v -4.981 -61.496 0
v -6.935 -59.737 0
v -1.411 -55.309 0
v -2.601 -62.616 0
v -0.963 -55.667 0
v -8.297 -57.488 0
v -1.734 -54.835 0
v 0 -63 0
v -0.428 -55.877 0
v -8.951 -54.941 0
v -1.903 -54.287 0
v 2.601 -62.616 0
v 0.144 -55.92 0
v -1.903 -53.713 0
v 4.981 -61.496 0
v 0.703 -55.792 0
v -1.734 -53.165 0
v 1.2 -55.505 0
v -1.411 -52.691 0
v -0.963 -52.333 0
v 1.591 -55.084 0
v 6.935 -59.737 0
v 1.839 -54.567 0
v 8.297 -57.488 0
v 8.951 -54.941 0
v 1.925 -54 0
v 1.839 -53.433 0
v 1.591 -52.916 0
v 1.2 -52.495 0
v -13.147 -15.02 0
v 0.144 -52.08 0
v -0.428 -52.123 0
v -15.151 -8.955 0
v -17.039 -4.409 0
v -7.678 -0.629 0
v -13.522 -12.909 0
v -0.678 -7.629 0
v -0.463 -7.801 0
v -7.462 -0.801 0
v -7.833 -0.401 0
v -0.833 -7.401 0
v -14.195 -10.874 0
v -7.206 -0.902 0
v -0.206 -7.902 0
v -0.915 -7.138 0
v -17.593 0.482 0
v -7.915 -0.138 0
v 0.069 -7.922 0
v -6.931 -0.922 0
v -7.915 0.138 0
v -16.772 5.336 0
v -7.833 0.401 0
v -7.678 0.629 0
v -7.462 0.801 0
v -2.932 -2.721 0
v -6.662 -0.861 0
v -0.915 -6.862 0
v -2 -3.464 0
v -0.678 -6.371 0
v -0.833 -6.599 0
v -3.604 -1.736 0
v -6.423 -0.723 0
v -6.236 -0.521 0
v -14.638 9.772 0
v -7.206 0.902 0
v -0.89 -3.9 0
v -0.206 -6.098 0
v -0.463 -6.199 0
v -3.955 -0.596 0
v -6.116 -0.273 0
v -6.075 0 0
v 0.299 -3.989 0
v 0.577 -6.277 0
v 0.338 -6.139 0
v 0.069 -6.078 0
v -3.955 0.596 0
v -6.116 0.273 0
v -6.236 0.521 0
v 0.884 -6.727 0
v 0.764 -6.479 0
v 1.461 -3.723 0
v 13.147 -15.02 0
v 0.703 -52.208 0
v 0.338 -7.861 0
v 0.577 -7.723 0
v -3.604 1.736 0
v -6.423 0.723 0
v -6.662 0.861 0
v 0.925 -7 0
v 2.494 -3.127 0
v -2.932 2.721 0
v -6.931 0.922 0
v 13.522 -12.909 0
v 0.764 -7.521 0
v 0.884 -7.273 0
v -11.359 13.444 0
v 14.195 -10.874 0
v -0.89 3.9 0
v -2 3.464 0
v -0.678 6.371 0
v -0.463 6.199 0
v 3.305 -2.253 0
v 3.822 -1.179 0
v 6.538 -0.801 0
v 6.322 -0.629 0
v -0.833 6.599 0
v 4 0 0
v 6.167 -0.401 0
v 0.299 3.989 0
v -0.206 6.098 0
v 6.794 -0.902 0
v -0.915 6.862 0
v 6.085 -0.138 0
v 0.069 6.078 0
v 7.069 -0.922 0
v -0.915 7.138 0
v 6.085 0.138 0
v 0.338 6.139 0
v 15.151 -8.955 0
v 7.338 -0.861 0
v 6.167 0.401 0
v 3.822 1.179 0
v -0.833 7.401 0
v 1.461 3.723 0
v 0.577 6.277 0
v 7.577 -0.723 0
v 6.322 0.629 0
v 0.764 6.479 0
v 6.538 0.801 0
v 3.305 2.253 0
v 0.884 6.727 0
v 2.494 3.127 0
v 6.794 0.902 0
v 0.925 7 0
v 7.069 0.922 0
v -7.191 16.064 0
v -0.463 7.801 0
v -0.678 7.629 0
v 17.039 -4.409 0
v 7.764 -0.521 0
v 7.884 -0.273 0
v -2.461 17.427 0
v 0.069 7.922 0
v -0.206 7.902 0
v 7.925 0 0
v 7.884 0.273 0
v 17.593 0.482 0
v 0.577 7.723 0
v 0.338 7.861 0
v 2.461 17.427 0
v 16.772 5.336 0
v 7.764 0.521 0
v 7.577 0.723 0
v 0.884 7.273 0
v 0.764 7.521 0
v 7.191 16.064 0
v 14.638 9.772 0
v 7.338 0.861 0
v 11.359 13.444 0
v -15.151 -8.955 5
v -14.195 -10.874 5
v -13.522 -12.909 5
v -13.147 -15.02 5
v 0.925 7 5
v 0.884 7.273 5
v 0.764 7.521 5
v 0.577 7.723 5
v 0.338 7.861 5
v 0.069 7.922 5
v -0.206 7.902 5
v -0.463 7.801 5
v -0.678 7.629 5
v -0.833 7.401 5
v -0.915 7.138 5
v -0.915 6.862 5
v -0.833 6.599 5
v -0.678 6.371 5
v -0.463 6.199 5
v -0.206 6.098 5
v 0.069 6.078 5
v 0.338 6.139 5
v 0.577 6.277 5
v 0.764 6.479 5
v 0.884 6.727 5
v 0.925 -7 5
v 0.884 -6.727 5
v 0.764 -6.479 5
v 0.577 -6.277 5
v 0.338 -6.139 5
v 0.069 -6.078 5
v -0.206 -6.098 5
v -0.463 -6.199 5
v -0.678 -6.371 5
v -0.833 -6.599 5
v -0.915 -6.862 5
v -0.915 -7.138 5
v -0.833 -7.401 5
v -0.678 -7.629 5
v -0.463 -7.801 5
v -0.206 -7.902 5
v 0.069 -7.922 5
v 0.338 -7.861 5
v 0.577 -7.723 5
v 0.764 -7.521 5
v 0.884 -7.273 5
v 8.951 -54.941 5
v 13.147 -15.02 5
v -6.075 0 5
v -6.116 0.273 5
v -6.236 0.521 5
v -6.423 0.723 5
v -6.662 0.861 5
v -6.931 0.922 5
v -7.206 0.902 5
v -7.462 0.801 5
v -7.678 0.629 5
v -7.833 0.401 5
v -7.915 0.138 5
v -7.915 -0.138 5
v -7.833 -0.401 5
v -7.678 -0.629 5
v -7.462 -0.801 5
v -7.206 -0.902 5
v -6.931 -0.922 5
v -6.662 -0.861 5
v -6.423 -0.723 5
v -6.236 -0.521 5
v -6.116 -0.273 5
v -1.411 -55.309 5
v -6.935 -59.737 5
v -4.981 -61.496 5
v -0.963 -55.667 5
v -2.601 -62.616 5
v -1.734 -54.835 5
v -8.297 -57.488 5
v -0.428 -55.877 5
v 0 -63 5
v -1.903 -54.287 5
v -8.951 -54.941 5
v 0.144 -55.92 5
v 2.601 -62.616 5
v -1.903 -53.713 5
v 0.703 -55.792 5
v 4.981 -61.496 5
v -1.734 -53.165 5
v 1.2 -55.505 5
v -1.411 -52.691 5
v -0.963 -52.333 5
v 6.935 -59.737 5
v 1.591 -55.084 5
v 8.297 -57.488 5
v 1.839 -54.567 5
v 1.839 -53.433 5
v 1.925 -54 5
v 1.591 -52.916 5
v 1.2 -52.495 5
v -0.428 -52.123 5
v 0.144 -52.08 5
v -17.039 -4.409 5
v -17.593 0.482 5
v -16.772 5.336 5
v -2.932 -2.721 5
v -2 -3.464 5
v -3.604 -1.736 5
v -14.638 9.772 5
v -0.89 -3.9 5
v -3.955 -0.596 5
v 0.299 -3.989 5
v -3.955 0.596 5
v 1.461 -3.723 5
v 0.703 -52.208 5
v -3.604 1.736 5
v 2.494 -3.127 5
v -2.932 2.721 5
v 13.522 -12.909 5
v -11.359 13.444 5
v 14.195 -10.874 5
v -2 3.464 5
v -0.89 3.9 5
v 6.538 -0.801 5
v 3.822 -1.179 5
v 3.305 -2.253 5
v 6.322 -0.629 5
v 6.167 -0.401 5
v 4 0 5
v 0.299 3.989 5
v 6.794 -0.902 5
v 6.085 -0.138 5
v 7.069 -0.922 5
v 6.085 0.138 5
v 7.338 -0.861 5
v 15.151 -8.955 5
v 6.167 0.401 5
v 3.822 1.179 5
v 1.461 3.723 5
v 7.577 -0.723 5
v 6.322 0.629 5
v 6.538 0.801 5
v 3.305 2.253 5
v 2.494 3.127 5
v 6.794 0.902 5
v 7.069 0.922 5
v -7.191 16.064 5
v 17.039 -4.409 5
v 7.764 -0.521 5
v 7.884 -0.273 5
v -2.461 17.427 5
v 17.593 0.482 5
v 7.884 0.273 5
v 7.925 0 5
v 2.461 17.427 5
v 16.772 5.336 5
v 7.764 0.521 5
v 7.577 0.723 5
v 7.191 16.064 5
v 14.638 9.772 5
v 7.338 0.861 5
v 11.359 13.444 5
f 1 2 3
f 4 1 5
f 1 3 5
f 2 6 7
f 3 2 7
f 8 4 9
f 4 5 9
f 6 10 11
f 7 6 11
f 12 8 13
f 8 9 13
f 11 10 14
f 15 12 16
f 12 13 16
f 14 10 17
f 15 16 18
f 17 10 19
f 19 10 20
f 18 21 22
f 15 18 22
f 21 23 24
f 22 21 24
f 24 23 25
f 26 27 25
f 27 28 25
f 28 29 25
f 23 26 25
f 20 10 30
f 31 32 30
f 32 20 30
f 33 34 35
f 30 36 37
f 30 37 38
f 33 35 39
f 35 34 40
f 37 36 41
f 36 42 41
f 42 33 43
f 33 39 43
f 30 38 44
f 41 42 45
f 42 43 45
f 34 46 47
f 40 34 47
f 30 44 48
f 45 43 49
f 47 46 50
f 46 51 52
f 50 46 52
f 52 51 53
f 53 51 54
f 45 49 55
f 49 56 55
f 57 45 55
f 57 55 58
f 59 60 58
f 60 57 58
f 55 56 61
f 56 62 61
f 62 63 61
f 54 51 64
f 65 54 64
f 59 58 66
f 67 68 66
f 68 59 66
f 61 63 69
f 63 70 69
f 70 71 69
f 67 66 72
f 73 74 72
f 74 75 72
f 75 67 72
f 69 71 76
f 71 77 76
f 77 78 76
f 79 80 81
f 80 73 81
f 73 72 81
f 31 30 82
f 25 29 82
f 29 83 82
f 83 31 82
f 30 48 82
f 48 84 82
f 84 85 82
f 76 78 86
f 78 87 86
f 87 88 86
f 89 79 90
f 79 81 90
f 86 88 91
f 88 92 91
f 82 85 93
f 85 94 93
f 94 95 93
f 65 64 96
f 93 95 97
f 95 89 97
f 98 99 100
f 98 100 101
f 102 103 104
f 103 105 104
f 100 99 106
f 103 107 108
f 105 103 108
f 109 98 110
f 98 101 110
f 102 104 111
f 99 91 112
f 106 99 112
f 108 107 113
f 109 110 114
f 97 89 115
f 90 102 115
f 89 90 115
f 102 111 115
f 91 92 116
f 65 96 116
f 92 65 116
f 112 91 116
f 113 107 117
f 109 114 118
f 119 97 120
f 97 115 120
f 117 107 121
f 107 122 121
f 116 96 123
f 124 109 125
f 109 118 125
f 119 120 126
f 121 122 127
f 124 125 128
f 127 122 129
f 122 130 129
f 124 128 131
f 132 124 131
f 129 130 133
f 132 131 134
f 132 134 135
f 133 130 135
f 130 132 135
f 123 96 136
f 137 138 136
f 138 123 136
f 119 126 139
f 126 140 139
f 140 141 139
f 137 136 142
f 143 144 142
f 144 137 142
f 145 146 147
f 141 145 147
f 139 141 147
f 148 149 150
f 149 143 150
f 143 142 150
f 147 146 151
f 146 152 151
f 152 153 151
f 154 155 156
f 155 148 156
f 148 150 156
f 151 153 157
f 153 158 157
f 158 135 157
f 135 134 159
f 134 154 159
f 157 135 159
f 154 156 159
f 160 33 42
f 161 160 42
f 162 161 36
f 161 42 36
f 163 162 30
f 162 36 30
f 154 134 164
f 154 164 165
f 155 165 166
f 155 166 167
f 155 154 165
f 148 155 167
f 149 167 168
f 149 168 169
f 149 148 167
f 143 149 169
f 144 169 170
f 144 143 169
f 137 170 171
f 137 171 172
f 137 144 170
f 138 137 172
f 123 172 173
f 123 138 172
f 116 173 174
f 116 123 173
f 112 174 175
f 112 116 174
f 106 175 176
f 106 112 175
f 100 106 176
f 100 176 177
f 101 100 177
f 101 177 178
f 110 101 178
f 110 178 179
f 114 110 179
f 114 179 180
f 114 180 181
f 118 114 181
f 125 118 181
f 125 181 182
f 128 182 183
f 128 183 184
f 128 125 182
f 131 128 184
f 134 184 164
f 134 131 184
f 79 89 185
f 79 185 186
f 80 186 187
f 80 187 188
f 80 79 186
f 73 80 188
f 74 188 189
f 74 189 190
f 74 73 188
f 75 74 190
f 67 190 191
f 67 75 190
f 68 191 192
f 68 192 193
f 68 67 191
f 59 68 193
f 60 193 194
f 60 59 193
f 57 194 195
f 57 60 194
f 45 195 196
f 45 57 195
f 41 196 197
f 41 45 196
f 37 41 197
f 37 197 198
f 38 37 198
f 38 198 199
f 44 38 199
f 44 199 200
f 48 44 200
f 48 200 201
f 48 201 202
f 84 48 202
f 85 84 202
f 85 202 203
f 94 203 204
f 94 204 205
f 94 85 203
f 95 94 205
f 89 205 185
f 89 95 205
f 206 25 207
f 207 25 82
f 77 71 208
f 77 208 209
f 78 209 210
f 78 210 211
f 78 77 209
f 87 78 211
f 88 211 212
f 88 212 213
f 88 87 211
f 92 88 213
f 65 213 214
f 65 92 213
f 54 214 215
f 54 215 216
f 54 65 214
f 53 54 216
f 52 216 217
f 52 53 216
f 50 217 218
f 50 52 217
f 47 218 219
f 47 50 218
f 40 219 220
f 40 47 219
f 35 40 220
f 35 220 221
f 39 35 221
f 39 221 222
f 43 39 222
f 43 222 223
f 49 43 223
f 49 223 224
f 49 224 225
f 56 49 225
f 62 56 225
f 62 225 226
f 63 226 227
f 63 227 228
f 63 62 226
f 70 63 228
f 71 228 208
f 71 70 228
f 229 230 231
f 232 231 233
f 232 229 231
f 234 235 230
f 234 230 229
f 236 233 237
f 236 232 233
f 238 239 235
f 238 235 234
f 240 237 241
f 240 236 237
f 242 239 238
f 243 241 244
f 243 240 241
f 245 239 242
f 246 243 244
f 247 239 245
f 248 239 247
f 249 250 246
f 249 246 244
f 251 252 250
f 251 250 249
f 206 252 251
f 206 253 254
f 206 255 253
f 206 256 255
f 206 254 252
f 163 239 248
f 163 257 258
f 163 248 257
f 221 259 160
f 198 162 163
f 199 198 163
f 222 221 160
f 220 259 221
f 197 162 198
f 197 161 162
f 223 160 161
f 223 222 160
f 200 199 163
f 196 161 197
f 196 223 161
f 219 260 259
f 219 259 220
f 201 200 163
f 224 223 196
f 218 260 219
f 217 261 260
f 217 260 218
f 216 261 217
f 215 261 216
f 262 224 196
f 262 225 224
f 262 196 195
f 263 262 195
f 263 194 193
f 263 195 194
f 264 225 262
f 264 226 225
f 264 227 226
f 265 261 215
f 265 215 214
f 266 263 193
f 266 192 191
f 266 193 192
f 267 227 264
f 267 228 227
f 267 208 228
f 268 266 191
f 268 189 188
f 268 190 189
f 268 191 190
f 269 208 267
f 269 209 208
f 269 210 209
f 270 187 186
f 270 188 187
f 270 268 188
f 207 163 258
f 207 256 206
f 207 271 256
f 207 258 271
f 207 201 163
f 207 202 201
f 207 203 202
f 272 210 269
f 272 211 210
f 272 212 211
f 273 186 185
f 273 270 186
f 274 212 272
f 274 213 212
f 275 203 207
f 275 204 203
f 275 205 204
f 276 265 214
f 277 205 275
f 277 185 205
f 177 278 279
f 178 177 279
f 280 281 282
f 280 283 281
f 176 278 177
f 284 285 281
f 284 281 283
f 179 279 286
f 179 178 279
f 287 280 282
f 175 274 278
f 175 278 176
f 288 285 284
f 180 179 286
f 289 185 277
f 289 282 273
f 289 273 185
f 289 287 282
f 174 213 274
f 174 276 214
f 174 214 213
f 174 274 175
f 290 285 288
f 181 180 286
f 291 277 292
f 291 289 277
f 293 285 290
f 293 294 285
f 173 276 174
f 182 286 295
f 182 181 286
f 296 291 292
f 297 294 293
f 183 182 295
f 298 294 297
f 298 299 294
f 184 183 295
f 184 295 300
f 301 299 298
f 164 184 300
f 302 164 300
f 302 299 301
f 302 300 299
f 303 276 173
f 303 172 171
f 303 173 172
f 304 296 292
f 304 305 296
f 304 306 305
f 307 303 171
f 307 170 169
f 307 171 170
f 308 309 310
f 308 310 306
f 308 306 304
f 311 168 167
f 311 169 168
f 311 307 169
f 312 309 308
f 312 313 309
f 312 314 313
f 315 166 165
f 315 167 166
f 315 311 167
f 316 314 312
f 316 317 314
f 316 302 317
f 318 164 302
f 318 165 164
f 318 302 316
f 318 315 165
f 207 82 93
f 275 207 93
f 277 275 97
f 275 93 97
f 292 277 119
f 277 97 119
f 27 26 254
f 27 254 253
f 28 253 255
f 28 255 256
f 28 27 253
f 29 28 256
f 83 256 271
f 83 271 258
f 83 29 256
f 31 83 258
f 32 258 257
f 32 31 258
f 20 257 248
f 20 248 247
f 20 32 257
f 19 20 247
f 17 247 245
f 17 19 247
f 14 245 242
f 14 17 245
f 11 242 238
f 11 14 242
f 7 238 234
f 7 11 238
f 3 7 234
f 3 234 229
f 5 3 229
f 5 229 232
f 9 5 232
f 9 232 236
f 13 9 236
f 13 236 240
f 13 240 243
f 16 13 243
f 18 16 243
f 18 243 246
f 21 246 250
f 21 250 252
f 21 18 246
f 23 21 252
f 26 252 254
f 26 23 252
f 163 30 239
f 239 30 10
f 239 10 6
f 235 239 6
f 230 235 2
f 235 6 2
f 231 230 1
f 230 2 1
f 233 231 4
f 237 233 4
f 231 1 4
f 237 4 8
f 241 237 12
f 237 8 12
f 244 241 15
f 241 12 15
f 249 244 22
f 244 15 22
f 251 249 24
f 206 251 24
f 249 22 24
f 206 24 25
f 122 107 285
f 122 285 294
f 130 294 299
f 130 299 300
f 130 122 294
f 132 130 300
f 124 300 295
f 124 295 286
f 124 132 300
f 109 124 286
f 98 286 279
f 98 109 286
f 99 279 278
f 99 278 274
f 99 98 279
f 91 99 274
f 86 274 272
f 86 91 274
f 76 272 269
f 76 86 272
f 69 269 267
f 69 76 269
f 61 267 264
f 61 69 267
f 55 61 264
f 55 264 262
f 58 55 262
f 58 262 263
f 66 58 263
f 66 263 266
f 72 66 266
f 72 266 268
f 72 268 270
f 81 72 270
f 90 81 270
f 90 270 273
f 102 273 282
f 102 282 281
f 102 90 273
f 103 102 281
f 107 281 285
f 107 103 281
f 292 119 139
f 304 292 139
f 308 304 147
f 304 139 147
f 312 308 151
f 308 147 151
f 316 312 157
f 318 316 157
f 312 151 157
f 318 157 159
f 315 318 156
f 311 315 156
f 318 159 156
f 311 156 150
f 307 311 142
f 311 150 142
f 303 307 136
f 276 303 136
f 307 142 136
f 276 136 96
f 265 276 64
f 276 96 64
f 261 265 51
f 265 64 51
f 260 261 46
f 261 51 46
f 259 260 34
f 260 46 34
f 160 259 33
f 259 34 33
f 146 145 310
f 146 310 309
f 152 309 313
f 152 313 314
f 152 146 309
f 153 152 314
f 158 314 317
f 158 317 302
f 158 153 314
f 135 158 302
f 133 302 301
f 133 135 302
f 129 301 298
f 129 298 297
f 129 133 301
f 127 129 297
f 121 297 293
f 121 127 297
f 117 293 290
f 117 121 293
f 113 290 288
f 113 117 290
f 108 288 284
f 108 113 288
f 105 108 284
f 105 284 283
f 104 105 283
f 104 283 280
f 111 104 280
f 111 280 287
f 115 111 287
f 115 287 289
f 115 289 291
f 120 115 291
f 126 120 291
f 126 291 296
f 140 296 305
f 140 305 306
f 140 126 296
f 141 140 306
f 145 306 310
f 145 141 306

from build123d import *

# Parameters (mm, degrees)
ESQUISSE1_R        = 1.925
ESQUISSE1_R_2      = 0.925
ESQUISSE1_R_3      = 4
BOSS_EXTRU_1_DEPTH = 5


with BuildPart() as part:
    # Esquisse1 → Boss.-Extru.1 (new body)
    with BuildSketch(Plane.XY):
        with BuildLine():
            Line((8.950697062, -54.94075613), (13.146568064, -15.019708545))
            ThreePointArc((13.146568064, -15.019708545), (13.822417384, -11.87955399), (15.151330627, -8.955287839))
            ThreePointArc((15.151330627, -8.955287839), (0, 17.600000001), (-15.151330627, -8.955287839))
            ThreePointArc((-15.151330627, -8.955287839), (-13.822417384, -11.87955399), (-13.146568064, -15.019708545))
            Line((-13.146568064, -15.019708545), (-8.950697062, -54.94075613))
            ThreePointArc((-8.950697062, -54.94075613), (0, -63), (8.950697062, -54.94075613))
        make_face()
        with Locations((0, -54)):
            Circle(ESQUISSE1_R, mode=Mode.SUBTRACT)
        with Locations((7, 0)):
            Circle(ESQUISSE1_R_2, mode=Mode.SUBTRACT)
        with Locations((0, -7)):
            Circle(ESQUISSE1_R_2, mode=Mode.SUBTRACT)
        with Locations((0, 7)):
            Circle(ESQUISSE1_R_2, mode=Mode.SUBTRACT)
        with Locations((-7, 0)):
            Circle(ESQUISSE1_R_2, mode=Mode.SUBTRACT)
        Circle(ESQUISSE1_R_3, mode=Mode.SUBTRACT)
    extrude(amount=BOSS_EXTRU_1_DEPTH)


solid = part.part
